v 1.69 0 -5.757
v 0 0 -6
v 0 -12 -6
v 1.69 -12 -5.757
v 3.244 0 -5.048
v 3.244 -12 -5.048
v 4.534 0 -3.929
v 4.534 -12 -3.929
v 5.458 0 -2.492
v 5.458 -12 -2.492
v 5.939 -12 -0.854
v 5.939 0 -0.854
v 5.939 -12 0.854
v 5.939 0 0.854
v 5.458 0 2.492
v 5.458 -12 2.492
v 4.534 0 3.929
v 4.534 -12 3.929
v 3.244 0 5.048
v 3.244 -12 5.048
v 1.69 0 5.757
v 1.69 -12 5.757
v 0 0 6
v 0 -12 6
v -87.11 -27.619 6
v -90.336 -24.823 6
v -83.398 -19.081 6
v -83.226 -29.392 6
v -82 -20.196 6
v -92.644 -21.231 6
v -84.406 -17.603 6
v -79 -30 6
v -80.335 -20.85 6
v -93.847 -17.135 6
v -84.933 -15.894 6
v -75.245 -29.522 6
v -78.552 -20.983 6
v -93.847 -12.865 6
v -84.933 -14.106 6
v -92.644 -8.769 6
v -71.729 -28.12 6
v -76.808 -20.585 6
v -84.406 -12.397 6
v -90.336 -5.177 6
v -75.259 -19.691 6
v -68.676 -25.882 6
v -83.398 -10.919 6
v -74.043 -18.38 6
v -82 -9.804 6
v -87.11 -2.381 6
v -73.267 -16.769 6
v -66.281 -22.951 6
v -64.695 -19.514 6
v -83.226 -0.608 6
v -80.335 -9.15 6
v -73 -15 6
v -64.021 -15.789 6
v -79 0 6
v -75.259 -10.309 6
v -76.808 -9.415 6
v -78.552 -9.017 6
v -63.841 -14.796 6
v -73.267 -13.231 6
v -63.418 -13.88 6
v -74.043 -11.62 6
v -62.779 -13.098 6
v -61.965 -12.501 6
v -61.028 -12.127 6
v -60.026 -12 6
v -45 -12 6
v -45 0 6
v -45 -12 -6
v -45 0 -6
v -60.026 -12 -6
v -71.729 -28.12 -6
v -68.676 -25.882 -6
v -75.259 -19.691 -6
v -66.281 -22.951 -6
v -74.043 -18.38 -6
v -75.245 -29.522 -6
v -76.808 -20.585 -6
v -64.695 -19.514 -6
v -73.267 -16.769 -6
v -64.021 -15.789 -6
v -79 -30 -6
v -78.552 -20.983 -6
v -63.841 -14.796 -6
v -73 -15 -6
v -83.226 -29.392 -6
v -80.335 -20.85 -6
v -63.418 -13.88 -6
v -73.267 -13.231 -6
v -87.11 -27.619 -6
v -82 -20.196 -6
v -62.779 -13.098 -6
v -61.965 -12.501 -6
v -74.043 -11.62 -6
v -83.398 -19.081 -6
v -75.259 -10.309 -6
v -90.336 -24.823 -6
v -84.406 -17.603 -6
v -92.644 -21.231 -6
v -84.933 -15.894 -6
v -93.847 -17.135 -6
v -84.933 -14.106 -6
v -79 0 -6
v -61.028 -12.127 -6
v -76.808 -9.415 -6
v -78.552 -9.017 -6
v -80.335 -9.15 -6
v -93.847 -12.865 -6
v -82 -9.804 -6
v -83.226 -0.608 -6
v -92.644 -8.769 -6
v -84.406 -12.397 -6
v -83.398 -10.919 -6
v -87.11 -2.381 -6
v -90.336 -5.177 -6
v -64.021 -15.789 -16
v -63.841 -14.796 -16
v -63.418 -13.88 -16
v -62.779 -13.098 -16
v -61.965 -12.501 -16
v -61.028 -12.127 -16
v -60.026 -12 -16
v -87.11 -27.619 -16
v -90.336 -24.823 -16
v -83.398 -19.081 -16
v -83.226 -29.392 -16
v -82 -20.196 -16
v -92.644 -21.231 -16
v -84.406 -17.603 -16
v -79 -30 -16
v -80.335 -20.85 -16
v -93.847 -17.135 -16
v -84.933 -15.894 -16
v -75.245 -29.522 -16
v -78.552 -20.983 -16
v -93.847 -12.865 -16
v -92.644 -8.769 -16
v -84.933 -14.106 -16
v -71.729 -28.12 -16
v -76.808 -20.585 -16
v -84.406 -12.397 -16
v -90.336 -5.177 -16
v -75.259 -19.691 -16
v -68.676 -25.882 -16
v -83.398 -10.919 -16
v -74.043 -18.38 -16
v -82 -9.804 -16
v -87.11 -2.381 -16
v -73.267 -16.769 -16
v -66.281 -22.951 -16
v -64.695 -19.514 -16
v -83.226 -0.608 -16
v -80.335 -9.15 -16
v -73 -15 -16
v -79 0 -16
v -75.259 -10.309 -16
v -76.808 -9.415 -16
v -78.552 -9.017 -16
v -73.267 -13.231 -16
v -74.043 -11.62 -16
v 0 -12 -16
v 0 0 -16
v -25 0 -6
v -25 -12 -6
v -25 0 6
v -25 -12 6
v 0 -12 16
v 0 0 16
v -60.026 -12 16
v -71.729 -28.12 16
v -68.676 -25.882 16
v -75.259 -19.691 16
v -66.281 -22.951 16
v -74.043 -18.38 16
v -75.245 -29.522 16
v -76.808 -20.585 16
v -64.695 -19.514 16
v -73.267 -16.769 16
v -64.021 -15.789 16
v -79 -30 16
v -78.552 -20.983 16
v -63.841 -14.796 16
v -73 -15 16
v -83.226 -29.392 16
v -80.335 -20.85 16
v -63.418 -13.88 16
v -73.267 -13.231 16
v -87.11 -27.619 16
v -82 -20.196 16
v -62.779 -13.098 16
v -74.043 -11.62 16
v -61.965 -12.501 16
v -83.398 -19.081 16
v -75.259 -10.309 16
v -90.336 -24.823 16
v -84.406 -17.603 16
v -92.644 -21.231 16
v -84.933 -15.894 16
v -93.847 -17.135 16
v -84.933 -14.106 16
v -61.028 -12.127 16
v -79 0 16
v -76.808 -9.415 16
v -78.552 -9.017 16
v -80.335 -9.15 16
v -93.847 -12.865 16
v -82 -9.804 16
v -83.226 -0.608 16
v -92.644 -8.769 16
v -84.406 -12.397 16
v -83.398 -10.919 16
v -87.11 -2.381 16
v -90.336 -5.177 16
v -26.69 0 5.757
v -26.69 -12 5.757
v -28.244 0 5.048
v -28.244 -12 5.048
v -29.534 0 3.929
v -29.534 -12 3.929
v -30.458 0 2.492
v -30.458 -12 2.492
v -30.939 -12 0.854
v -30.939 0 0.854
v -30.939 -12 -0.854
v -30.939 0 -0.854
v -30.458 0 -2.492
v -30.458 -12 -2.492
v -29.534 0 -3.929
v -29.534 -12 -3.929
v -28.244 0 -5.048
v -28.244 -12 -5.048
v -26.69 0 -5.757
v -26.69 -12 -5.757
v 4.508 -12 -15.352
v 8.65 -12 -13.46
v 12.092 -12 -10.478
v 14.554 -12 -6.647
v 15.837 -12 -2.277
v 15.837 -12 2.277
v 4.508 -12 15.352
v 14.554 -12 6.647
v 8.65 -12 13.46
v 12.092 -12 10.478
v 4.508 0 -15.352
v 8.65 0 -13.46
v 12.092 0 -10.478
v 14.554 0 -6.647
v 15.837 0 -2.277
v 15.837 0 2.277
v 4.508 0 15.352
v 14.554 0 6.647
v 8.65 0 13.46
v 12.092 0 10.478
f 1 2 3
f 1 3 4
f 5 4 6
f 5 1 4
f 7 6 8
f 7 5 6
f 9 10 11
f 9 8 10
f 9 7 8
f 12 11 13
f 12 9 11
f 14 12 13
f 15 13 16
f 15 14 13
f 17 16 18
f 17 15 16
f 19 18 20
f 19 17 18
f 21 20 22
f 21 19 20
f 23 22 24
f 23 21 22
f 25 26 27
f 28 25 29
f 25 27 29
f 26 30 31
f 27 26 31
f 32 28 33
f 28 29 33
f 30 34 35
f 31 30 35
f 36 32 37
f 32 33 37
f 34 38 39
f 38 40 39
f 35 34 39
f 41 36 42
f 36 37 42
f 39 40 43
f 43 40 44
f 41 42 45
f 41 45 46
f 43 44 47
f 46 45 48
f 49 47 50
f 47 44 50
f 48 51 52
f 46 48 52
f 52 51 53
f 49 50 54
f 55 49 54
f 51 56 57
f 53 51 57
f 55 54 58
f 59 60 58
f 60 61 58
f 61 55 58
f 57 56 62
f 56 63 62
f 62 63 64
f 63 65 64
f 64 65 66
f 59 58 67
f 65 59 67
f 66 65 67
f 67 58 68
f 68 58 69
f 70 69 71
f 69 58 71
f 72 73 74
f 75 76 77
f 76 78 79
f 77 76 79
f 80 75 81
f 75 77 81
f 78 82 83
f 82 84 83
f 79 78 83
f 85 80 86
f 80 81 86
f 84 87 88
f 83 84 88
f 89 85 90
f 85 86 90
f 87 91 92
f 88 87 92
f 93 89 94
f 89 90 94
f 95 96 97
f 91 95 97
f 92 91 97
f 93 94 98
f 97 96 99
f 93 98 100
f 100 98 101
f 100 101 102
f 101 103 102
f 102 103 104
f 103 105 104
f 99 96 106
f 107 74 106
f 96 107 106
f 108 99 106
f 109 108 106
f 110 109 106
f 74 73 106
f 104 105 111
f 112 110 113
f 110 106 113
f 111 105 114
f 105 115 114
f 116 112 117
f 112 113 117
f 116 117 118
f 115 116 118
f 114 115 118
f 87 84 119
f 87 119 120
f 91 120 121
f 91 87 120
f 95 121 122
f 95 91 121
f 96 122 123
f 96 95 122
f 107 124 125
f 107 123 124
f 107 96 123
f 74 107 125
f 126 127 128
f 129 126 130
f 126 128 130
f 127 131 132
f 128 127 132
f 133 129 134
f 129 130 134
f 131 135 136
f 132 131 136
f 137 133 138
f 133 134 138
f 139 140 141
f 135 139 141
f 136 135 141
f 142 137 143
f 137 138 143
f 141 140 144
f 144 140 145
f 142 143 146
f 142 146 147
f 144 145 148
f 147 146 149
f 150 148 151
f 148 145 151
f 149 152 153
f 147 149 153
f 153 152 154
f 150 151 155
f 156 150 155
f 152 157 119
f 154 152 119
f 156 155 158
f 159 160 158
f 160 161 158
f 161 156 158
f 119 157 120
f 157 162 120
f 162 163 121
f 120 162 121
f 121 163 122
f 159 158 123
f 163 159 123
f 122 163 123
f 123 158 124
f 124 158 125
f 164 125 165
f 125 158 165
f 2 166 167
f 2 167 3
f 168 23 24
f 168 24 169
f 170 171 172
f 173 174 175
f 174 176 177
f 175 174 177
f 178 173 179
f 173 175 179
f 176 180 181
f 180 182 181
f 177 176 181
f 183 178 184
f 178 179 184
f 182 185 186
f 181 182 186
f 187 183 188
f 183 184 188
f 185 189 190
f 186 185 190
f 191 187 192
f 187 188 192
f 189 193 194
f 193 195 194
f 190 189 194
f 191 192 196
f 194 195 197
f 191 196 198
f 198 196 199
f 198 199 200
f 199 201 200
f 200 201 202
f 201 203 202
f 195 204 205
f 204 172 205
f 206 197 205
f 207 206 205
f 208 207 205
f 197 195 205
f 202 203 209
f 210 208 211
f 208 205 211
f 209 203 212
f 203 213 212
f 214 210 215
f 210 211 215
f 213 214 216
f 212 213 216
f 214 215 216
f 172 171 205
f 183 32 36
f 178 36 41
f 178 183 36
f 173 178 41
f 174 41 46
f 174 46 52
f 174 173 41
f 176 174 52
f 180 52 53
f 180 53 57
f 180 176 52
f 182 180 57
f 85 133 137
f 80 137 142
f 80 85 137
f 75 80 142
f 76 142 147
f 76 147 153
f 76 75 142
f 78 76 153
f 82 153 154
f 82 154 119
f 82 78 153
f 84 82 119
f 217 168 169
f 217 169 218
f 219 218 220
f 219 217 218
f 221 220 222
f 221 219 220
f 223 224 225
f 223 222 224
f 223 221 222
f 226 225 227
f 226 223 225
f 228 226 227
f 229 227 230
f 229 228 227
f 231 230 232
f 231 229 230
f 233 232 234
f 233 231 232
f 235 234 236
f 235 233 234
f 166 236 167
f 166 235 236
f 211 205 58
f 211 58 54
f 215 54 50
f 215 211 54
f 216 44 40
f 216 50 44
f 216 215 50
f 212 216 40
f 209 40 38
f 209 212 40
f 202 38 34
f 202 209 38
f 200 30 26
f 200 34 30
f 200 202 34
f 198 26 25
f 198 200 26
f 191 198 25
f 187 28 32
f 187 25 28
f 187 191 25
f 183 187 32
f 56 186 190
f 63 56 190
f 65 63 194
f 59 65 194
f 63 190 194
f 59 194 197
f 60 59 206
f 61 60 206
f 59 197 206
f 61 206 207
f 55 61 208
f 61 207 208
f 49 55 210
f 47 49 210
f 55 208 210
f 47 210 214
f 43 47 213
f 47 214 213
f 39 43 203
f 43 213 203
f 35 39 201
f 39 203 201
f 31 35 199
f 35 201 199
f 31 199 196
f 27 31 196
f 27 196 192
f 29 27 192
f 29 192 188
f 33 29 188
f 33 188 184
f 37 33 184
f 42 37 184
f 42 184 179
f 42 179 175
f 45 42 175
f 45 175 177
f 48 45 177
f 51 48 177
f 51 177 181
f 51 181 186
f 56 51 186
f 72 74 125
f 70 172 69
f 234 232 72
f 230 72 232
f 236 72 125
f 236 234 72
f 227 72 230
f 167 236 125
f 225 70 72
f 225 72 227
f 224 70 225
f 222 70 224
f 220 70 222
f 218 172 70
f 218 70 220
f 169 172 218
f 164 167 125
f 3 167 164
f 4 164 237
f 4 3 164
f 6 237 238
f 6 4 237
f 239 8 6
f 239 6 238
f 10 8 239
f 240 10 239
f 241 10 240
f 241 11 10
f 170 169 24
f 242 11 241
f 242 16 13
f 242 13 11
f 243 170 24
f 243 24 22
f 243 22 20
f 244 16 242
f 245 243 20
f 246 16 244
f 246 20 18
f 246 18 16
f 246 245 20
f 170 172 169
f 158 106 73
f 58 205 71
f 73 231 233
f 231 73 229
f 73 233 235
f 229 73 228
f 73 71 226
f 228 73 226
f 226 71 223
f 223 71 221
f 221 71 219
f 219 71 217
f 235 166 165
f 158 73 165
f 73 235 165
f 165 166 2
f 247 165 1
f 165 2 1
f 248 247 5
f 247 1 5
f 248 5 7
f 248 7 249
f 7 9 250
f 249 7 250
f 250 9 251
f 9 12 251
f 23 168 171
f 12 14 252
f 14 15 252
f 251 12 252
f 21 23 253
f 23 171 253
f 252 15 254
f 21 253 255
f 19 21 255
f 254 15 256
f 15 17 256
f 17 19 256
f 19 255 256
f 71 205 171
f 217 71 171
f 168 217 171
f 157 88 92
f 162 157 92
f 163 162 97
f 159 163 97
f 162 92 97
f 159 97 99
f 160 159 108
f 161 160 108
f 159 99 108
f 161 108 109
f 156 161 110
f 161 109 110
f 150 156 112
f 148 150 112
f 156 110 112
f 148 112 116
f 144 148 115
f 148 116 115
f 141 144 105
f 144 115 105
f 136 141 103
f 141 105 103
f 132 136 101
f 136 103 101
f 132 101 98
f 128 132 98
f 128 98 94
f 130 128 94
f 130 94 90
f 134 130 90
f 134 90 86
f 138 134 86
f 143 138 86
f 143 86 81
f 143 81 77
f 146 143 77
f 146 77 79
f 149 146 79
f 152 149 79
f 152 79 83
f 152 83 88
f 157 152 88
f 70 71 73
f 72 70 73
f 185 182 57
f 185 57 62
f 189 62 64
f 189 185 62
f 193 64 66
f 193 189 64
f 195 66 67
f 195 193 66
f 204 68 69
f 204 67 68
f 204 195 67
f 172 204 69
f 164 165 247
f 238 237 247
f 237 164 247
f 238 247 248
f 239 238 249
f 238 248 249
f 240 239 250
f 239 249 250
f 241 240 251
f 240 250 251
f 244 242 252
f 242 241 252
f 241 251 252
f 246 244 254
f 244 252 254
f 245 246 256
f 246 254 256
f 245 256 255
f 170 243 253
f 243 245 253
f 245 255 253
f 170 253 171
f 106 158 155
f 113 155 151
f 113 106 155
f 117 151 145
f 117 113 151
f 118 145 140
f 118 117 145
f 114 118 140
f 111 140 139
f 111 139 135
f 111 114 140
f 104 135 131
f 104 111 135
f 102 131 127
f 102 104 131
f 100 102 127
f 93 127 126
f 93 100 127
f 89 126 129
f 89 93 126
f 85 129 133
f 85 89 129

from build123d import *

# Parameters (mm, degrees)
F1_DEPTH = 12
F2_DEPTH = 30
F3_DEPTH = 25
F4_DEPTH = 25
F5_R     = 6
F5_W     = 16
F5_H     = 12
F6_DEPTH = 46.7


with BuildPart() as f1:
    # F0 (on Front) → F1 (new body)
    with BuildSketch(Plane.XZ):
        with BuildLine():
            Line((-94, -16), (0, -16))
            ThreePointArc((0, -16), (16, 0), (0, 16))
            Line((0, 16), (-94, 16))
            Line((-94, 16), (-94, 6))
            Line((-94, 6), (-45, 6))
            Line((-45, 6), (-45, -6))
            Line((-45, -6), (-94, -6))
            Line((-94, -6), (-94, -16))
        make_face()
        with BuildLine():
            ThreePointArc((-25, -6), (-31, 0), (-25, 6))
            Line((-25, 6), (0, 6))
            ThreePointArc((0, 6), (6, 0), (0, -6))
            Line((0, -6), (-25, -6))
        make_face(mode=Mode.SUBTRACT)
        with BuildLine():
            Line((0, 6), (-25, 6))
            ThreePointArc((-25, 6), (-31, 0), (-25, -6))
            Line((-25, -6), (0, -6))
            ThreePointArc((0, -6), (6, 0), (0, 6))
        make_face()
    extrude(amount=F1_DEPTH)

    # F0 (on Front) → F2 (join)
    with BuildSketch(Plane.XZ):
        with BuildLine():
            Line((-94, -16), (0, -16))
            ThreePointArc((0, -16), (16, 0), (0, 16))
            Line((0, 16), (-94, 16))
            Line((-94, 16), (-94, 6))
            Line((-94, 6), (-45, 6))
            Line((-45, 6), (-45, -6))
            Line((-45, -6), (-94, -6))
            Line((-94, -6), (-94, -16))
        make_face()
        with BuildLine():
            ThreePointArc((-25, -6), (-31, 0), (-25, 6))
            Line((-25, 6), (0, 6))
            ThreePointArc((0, 6), (6, 0), (0, -6))
            Line((0, -6), (-25, -6))
        make_face(mode=Mode.SUBTRACT)
    extrude(amount=F2_DEPTH)

    # F0 (on Front) → F3 (join)
    with BuildSketch(Plane.XZ):
        with BuildLine():
            Line((0, 6), (-25, 6))
            ThreePointArc((-25, 6), (-31, 0), (-25, -6))
            Line((-25, -6), (0, -6))
            ThreePointArc((0, -6), (6, 0), (0, 6))
        make_face()
    extrude(amount=F3_DEPTH)

    # F0 (on Front) → F4 (cut)
    with BuildSketch(Plane.XZ):
        with BuildLine():
            Line((0, 6), (-25, 6))
            ThreePointArc((-25, 6), (-31, 0), (-25, -6))
            Line((-25, -6), (0, -6))
            ThreePointArc((0, -6), (6, 0), (0, 6))
        make_face()
    extrude(amount=F4_DEPTH, mode=Mode.SUBTRACT)

    # F5 (on face) → F6 (intersect)
    with BuildSketch(Plane.XY.offset(16)):
        with BuildLine():
            Line((0, 0), (-79, 0))
            ThreePointArc((-79, 0), (-89.6066017178, -4.3933982822), (-94, -15))
            ThreePointArc((-94, -15), (-89.6066017178, -25.6066017178), (-79, -30))
            ThreePointArc((-79, -30), (-68.6762919758, -25.8821437517), (-64.0207900308, -15.7894736842))
            ThreePointArc((-64.0207900308, -15.7894736842), (-62.7793228454, -13.0980949996), (-60.026334039, -12))
            Line((-60.026334039, -12), (0, -12))
            Line((0, -12), (0, 0))
        make_face()
        with Locations((-79, -15)):
            Circle(F5_R, mode=Mode.SUBTRACT)
        with Locations((8, -6)):
            Rectangle(F5_W, F5_H)
    extrude(amount=-F6_DEPTH, mode=Mode.INTERSECT)


solid = f1.part
